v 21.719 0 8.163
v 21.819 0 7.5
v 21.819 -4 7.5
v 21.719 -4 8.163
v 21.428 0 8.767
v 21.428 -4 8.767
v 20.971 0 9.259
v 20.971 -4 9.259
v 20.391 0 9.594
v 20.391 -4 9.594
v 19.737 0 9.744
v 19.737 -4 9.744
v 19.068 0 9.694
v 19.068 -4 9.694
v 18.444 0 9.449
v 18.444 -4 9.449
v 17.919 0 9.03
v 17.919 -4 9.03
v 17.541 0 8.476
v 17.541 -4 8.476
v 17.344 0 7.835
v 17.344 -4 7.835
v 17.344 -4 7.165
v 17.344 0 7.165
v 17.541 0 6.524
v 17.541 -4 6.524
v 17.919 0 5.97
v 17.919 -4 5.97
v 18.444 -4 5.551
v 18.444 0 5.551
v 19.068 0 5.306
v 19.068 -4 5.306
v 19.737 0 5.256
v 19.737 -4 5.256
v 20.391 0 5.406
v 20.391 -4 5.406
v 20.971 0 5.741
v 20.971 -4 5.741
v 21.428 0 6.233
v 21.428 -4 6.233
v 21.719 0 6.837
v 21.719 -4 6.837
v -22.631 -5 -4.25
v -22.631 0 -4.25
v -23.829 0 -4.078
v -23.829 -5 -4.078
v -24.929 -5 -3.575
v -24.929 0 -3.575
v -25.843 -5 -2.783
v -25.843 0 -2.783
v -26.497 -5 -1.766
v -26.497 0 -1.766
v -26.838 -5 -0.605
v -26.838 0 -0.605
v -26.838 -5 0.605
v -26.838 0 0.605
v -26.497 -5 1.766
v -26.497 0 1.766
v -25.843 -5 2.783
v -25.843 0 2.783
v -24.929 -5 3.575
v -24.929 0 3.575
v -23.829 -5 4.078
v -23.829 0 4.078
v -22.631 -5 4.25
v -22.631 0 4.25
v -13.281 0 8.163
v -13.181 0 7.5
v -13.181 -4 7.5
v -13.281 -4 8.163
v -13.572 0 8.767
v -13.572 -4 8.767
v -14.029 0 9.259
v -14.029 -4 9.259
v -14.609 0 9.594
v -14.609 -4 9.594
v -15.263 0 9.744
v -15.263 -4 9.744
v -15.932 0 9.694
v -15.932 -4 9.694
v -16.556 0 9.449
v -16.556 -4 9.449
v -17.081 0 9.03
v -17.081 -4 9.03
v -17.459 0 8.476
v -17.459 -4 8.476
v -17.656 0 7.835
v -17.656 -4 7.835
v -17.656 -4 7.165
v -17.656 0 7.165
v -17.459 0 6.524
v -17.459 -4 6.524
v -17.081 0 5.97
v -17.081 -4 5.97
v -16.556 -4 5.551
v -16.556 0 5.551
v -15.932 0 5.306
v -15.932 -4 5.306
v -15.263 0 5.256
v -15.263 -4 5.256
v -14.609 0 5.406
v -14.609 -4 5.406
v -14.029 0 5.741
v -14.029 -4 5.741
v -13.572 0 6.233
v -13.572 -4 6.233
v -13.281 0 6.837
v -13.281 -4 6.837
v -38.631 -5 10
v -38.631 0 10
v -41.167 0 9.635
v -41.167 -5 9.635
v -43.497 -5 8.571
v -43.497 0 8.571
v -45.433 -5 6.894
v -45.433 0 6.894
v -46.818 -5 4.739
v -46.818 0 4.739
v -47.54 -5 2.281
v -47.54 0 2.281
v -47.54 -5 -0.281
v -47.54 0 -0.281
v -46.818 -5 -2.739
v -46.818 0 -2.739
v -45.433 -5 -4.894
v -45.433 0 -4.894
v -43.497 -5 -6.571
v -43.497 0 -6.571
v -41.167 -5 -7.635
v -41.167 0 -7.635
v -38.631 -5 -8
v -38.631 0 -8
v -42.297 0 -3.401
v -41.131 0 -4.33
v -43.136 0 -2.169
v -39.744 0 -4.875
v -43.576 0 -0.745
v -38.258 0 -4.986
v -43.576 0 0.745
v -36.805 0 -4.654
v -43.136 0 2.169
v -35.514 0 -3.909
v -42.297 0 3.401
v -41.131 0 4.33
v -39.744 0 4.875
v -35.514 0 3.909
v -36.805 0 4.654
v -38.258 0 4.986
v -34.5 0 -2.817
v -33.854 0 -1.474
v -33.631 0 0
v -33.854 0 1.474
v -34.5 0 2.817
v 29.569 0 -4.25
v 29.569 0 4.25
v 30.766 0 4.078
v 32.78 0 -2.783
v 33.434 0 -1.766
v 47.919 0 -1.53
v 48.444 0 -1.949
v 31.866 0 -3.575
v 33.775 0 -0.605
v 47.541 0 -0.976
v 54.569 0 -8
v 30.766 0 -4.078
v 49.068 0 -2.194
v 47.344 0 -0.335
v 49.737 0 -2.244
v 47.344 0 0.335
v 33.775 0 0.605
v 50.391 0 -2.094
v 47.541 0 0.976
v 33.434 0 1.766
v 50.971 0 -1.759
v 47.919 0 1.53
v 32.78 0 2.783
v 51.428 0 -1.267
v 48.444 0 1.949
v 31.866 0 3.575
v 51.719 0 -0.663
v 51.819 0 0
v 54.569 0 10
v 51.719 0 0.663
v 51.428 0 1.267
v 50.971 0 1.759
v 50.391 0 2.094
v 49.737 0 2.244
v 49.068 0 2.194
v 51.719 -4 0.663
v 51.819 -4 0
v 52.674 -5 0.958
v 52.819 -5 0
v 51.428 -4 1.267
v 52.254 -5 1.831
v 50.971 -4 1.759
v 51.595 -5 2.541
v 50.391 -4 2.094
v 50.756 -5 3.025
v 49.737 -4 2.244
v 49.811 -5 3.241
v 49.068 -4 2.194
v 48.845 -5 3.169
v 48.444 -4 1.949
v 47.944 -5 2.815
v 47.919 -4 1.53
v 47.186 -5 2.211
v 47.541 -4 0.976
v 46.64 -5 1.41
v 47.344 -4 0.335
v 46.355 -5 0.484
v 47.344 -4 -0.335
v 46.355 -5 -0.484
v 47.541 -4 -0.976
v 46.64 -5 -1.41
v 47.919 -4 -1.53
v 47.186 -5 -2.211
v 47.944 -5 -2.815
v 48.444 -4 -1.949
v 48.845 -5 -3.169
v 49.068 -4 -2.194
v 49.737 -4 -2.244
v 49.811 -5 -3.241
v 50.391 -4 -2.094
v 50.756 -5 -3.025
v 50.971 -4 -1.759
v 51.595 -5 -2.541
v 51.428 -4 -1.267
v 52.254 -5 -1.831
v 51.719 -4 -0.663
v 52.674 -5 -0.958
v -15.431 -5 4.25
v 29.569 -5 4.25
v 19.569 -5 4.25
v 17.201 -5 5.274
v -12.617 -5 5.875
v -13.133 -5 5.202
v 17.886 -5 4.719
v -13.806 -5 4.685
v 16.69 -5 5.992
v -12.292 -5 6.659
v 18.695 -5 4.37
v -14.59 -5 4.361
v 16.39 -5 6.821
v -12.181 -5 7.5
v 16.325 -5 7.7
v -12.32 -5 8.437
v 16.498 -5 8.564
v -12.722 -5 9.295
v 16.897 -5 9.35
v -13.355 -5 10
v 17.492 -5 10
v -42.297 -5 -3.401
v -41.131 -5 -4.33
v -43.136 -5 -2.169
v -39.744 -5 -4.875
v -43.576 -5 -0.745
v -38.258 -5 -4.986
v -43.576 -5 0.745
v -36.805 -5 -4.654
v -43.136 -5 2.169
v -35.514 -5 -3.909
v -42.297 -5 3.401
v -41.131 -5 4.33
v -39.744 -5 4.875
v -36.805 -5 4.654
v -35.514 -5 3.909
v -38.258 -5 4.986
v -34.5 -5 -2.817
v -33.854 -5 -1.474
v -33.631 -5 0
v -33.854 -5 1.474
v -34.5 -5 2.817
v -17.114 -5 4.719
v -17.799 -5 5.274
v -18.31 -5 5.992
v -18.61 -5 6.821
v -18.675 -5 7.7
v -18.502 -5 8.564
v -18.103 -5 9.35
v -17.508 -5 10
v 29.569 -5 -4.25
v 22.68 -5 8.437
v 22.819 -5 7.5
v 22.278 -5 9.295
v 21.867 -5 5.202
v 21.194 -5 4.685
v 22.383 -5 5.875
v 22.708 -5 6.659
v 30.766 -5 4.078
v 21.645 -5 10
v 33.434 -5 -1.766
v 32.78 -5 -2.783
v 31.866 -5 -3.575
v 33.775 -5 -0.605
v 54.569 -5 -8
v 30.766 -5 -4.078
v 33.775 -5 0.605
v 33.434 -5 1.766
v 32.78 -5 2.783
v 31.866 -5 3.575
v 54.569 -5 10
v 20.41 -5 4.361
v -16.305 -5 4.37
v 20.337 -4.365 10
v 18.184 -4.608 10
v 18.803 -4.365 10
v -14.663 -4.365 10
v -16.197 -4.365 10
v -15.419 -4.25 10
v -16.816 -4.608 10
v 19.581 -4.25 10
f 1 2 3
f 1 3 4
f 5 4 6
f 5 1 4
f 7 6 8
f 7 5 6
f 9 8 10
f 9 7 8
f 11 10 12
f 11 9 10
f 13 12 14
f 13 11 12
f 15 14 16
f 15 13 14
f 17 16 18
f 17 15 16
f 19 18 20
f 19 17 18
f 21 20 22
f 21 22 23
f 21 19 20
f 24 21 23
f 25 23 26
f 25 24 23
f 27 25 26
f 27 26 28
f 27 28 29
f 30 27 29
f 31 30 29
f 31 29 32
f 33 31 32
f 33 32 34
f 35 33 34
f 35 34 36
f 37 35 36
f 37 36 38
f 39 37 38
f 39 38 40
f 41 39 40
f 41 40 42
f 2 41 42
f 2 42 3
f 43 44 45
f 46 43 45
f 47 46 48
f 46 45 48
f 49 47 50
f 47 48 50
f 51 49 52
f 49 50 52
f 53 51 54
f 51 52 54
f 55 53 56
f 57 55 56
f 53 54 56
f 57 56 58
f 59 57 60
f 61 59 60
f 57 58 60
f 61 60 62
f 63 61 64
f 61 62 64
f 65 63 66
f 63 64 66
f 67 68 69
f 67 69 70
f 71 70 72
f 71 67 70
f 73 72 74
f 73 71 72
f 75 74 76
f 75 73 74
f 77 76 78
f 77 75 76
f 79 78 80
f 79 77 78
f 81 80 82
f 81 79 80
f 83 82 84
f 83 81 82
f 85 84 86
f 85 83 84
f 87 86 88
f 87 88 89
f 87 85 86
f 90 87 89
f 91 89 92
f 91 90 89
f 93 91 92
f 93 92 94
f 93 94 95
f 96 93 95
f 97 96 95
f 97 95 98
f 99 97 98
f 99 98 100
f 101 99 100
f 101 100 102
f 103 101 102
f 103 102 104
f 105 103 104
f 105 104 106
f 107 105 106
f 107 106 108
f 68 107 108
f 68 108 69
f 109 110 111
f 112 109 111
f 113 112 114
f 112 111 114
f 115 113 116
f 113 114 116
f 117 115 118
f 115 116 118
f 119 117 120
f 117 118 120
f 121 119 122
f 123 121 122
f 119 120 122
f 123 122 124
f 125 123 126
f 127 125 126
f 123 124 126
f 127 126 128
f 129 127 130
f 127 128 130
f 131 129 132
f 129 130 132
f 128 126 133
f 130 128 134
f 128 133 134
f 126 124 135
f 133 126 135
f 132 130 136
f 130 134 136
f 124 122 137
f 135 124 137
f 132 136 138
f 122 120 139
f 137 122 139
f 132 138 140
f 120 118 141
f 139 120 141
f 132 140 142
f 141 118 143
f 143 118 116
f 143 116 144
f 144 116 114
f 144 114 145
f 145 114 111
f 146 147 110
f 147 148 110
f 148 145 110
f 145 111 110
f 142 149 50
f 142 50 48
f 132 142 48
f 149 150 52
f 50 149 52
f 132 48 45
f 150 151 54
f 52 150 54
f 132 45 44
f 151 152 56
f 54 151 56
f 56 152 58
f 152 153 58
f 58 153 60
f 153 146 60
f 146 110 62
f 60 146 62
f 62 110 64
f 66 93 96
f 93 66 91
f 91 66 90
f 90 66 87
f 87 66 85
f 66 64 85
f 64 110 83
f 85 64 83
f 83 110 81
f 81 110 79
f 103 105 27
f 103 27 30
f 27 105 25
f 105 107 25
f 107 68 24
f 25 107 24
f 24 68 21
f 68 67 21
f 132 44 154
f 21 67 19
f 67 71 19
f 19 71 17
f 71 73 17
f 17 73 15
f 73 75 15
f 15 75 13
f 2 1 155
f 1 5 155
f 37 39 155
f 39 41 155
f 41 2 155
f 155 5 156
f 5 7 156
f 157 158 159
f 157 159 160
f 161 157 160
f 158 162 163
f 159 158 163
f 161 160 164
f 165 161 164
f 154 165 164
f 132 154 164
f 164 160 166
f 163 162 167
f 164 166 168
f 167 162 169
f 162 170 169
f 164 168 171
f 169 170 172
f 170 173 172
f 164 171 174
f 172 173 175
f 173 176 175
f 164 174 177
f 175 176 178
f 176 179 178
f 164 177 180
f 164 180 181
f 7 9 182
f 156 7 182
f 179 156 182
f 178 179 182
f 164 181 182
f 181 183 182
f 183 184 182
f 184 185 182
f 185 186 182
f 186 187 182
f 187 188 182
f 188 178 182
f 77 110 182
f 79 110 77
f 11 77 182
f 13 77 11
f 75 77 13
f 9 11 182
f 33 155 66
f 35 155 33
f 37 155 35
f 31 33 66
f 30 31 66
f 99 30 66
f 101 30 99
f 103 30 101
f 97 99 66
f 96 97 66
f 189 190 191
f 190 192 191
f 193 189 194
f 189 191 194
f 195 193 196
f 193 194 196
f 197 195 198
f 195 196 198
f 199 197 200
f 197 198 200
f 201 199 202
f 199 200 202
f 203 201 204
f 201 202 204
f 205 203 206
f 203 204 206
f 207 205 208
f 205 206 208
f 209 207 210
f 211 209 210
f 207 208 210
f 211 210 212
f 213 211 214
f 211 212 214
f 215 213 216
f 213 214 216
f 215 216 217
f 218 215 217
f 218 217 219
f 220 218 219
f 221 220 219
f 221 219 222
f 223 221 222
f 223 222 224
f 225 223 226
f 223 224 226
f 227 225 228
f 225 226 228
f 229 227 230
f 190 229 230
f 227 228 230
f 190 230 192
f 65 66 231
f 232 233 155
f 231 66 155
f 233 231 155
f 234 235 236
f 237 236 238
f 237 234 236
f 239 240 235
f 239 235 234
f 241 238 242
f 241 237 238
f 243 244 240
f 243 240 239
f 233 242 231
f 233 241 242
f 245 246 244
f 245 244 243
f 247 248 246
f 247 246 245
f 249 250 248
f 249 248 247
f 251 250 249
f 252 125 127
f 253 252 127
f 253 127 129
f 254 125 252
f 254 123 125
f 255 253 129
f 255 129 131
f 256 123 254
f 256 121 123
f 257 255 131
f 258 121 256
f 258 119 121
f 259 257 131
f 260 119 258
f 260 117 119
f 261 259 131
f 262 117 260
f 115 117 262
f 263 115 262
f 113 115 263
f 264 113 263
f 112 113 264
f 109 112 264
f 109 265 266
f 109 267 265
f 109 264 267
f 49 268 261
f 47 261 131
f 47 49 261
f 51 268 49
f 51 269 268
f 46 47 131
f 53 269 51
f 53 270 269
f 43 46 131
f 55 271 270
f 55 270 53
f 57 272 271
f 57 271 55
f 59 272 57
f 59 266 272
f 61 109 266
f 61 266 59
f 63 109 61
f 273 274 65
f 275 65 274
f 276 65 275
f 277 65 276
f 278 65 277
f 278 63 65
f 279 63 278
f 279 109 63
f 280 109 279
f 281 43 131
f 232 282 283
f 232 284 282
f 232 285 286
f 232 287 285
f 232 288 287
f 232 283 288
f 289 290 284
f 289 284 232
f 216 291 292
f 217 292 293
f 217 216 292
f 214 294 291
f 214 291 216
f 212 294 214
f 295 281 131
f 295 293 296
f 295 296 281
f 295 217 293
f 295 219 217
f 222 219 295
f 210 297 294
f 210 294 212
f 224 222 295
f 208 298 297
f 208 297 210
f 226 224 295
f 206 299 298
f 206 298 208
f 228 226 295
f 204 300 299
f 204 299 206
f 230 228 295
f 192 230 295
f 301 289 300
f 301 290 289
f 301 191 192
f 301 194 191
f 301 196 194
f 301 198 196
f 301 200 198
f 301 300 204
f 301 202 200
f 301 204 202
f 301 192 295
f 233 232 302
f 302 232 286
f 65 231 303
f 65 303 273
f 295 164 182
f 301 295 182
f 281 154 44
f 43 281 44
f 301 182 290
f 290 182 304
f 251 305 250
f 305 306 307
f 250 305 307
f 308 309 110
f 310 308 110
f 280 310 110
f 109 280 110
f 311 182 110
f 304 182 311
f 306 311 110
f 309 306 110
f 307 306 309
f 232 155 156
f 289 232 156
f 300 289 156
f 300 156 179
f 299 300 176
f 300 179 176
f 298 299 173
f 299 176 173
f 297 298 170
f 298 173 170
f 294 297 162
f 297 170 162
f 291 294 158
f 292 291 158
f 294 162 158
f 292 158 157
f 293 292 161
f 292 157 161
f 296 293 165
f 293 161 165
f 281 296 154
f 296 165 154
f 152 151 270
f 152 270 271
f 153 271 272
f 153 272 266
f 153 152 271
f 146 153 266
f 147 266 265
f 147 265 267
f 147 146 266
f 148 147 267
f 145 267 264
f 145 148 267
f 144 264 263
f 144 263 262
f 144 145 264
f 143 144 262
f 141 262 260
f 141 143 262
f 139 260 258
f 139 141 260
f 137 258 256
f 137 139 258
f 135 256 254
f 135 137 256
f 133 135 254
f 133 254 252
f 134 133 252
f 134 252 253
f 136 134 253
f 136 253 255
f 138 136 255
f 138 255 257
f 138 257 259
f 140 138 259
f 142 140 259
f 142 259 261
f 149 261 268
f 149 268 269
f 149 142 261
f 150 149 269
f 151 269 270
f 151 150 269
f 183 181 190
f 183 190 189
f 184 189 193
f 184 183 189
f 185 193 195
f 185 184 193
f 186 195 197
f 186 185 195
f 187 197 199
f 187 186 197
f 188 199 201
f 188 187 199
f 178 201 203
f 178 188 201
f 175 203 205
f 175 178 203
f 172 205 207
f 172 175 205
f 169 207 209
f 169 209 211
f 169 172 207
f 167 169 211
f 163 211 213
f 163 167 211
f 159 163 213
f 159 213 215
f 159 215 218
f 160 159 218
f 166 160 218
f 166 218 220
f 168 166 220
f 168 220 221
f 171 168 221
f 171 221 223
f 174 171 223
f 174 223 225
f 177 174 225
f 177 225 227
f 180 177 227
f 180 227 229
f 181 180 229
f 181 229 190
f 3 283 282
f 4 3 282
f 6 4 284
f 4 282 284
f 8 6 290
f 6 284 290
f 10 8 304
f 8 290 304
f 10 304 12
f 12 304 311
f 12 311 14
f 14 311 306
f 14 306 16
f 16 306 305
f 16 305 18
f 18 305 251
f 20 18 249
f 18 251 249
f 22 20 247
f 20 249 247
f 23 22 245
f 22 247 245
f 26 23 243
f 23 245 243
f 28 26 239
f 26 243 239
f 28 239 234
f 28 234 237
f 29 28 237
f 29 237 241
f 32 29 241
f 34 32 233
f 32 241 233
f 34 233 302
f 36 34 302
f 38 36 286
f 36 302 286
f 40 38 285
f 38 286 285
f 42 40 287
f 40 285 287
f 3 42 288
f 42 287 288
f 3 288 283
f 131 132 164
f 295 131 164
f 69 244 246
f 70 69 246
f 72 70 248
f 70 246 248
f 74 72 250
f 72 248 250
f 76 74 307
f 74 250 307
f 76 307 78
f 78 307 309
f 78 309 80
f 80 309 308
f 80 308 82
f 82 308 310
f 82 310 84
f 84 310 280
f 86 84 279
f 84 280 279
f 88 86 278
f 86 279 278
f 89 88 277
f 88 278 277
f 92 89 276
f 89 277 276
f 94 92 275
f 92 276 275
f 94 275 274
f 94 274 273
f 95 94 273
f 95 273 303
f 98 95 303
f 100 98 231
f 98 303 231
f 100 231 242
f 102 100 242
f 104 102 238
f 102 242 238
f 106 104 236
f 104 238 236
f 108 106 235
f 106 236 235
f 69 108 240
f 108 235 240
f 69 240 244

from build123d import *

# Parameters (mm, degrees)
F0_R     = 5
F0_R_2   = 2.25
F1_DEPTH = 5


# Not quite as in the source:
# - a fillet or chamfer that OpenCascade refuses, or shapes differently, is made with other operations: its cross-section is extruded or revolved along the edge and cut away or added


with BuildPart() as f1:
    # F0 (on Front) → F1 (new body)
    with BuildSketch(Plane.XZ):
        with BuildLine():
            Line((54.5685509182, 10), (-38.6314490818, 10))
            ThreePointArc((-38.6314490818, 10), (-47.6314490818, 1), (-38.6314490818, -8))
            Line((-38.6314490818, -8), (54.5685509182, -8))
            Line((54.5685509182, -8), (54.5685509182, 10))
        make_face()
        with Locations((-38.6314490818, 0)):
            Circle(F0_R, mode=Mode.SUBTRACT)
        with BuildLine():
            ThreePointArc((-22.6314490818, -4.25), (-26.8814490818, 0), (-22.6314490818, 4.25))
            Line((-22.6314490818, 4.25), (29.5685509182, 4.25))
            ThreePointArc((29.5685509182, 4.25), (33.8185509182, 0), (29.5685509182, -4.25))
            Line((29.5685509182, -4.25), (-22.6314490818, -4.25))
        make_face(mode=Mode.SUBTRACT)
        with Locations((49.5685509182, 0)):
            Circle(F0_R_2, mode=Mode.SUBTRACT)
        with Locations((-15.4314490818, 7.5)):
            Circle(F0_R_2, mode=Mode.SUBTRACT)
        with Locations((19.5685509182, 7.5)):
            Circle(F0_R_2, mode=Mode.SUBTRACT)
    extrude(amount=F1_DEPTH)

    # F2: chamfer of 1 on 3 edges, made by hand

    # F2_s1 → F2_t2 (revolve, cut)
    with BuildSketch(Plane.XY.offset(7.5)):
        Polygon((-13.1814490818, -4), (-12.1814490818, -5), (-13.1814490818, -5), align=None)
    revolve(axis=Axis((-15.4314490818, -5, 7.5), (0, -1, 0)), mode=Mode.SUBTRACT)

    # F2_s3 → F2_t4 (revolve, cut)
    with BuildSketch(Plane.XY.offset(7.5)):
        Polygon((21.8185509182, -4), (22.8185509182, -5), (21.8185509182, -5), align=None)
    revolve(axis=Axis((19.5685509182, -5, 7.5), (0, -1, 0)), mode=Mode.SUBTRACT)

    # F2_s5 → F2_t6 (revolve, cut)
    with BuildSketch(Plane.XY):
        Polygon((51.8185509182, -4), (52.8185509182, -5), (51.8185509182, -5), align=None)
    revolve(axis=Axis((49.5685509182, -5, 0), (0, -1, 0)), mode=Mode.SUBTRACT)


solid = f1.part
